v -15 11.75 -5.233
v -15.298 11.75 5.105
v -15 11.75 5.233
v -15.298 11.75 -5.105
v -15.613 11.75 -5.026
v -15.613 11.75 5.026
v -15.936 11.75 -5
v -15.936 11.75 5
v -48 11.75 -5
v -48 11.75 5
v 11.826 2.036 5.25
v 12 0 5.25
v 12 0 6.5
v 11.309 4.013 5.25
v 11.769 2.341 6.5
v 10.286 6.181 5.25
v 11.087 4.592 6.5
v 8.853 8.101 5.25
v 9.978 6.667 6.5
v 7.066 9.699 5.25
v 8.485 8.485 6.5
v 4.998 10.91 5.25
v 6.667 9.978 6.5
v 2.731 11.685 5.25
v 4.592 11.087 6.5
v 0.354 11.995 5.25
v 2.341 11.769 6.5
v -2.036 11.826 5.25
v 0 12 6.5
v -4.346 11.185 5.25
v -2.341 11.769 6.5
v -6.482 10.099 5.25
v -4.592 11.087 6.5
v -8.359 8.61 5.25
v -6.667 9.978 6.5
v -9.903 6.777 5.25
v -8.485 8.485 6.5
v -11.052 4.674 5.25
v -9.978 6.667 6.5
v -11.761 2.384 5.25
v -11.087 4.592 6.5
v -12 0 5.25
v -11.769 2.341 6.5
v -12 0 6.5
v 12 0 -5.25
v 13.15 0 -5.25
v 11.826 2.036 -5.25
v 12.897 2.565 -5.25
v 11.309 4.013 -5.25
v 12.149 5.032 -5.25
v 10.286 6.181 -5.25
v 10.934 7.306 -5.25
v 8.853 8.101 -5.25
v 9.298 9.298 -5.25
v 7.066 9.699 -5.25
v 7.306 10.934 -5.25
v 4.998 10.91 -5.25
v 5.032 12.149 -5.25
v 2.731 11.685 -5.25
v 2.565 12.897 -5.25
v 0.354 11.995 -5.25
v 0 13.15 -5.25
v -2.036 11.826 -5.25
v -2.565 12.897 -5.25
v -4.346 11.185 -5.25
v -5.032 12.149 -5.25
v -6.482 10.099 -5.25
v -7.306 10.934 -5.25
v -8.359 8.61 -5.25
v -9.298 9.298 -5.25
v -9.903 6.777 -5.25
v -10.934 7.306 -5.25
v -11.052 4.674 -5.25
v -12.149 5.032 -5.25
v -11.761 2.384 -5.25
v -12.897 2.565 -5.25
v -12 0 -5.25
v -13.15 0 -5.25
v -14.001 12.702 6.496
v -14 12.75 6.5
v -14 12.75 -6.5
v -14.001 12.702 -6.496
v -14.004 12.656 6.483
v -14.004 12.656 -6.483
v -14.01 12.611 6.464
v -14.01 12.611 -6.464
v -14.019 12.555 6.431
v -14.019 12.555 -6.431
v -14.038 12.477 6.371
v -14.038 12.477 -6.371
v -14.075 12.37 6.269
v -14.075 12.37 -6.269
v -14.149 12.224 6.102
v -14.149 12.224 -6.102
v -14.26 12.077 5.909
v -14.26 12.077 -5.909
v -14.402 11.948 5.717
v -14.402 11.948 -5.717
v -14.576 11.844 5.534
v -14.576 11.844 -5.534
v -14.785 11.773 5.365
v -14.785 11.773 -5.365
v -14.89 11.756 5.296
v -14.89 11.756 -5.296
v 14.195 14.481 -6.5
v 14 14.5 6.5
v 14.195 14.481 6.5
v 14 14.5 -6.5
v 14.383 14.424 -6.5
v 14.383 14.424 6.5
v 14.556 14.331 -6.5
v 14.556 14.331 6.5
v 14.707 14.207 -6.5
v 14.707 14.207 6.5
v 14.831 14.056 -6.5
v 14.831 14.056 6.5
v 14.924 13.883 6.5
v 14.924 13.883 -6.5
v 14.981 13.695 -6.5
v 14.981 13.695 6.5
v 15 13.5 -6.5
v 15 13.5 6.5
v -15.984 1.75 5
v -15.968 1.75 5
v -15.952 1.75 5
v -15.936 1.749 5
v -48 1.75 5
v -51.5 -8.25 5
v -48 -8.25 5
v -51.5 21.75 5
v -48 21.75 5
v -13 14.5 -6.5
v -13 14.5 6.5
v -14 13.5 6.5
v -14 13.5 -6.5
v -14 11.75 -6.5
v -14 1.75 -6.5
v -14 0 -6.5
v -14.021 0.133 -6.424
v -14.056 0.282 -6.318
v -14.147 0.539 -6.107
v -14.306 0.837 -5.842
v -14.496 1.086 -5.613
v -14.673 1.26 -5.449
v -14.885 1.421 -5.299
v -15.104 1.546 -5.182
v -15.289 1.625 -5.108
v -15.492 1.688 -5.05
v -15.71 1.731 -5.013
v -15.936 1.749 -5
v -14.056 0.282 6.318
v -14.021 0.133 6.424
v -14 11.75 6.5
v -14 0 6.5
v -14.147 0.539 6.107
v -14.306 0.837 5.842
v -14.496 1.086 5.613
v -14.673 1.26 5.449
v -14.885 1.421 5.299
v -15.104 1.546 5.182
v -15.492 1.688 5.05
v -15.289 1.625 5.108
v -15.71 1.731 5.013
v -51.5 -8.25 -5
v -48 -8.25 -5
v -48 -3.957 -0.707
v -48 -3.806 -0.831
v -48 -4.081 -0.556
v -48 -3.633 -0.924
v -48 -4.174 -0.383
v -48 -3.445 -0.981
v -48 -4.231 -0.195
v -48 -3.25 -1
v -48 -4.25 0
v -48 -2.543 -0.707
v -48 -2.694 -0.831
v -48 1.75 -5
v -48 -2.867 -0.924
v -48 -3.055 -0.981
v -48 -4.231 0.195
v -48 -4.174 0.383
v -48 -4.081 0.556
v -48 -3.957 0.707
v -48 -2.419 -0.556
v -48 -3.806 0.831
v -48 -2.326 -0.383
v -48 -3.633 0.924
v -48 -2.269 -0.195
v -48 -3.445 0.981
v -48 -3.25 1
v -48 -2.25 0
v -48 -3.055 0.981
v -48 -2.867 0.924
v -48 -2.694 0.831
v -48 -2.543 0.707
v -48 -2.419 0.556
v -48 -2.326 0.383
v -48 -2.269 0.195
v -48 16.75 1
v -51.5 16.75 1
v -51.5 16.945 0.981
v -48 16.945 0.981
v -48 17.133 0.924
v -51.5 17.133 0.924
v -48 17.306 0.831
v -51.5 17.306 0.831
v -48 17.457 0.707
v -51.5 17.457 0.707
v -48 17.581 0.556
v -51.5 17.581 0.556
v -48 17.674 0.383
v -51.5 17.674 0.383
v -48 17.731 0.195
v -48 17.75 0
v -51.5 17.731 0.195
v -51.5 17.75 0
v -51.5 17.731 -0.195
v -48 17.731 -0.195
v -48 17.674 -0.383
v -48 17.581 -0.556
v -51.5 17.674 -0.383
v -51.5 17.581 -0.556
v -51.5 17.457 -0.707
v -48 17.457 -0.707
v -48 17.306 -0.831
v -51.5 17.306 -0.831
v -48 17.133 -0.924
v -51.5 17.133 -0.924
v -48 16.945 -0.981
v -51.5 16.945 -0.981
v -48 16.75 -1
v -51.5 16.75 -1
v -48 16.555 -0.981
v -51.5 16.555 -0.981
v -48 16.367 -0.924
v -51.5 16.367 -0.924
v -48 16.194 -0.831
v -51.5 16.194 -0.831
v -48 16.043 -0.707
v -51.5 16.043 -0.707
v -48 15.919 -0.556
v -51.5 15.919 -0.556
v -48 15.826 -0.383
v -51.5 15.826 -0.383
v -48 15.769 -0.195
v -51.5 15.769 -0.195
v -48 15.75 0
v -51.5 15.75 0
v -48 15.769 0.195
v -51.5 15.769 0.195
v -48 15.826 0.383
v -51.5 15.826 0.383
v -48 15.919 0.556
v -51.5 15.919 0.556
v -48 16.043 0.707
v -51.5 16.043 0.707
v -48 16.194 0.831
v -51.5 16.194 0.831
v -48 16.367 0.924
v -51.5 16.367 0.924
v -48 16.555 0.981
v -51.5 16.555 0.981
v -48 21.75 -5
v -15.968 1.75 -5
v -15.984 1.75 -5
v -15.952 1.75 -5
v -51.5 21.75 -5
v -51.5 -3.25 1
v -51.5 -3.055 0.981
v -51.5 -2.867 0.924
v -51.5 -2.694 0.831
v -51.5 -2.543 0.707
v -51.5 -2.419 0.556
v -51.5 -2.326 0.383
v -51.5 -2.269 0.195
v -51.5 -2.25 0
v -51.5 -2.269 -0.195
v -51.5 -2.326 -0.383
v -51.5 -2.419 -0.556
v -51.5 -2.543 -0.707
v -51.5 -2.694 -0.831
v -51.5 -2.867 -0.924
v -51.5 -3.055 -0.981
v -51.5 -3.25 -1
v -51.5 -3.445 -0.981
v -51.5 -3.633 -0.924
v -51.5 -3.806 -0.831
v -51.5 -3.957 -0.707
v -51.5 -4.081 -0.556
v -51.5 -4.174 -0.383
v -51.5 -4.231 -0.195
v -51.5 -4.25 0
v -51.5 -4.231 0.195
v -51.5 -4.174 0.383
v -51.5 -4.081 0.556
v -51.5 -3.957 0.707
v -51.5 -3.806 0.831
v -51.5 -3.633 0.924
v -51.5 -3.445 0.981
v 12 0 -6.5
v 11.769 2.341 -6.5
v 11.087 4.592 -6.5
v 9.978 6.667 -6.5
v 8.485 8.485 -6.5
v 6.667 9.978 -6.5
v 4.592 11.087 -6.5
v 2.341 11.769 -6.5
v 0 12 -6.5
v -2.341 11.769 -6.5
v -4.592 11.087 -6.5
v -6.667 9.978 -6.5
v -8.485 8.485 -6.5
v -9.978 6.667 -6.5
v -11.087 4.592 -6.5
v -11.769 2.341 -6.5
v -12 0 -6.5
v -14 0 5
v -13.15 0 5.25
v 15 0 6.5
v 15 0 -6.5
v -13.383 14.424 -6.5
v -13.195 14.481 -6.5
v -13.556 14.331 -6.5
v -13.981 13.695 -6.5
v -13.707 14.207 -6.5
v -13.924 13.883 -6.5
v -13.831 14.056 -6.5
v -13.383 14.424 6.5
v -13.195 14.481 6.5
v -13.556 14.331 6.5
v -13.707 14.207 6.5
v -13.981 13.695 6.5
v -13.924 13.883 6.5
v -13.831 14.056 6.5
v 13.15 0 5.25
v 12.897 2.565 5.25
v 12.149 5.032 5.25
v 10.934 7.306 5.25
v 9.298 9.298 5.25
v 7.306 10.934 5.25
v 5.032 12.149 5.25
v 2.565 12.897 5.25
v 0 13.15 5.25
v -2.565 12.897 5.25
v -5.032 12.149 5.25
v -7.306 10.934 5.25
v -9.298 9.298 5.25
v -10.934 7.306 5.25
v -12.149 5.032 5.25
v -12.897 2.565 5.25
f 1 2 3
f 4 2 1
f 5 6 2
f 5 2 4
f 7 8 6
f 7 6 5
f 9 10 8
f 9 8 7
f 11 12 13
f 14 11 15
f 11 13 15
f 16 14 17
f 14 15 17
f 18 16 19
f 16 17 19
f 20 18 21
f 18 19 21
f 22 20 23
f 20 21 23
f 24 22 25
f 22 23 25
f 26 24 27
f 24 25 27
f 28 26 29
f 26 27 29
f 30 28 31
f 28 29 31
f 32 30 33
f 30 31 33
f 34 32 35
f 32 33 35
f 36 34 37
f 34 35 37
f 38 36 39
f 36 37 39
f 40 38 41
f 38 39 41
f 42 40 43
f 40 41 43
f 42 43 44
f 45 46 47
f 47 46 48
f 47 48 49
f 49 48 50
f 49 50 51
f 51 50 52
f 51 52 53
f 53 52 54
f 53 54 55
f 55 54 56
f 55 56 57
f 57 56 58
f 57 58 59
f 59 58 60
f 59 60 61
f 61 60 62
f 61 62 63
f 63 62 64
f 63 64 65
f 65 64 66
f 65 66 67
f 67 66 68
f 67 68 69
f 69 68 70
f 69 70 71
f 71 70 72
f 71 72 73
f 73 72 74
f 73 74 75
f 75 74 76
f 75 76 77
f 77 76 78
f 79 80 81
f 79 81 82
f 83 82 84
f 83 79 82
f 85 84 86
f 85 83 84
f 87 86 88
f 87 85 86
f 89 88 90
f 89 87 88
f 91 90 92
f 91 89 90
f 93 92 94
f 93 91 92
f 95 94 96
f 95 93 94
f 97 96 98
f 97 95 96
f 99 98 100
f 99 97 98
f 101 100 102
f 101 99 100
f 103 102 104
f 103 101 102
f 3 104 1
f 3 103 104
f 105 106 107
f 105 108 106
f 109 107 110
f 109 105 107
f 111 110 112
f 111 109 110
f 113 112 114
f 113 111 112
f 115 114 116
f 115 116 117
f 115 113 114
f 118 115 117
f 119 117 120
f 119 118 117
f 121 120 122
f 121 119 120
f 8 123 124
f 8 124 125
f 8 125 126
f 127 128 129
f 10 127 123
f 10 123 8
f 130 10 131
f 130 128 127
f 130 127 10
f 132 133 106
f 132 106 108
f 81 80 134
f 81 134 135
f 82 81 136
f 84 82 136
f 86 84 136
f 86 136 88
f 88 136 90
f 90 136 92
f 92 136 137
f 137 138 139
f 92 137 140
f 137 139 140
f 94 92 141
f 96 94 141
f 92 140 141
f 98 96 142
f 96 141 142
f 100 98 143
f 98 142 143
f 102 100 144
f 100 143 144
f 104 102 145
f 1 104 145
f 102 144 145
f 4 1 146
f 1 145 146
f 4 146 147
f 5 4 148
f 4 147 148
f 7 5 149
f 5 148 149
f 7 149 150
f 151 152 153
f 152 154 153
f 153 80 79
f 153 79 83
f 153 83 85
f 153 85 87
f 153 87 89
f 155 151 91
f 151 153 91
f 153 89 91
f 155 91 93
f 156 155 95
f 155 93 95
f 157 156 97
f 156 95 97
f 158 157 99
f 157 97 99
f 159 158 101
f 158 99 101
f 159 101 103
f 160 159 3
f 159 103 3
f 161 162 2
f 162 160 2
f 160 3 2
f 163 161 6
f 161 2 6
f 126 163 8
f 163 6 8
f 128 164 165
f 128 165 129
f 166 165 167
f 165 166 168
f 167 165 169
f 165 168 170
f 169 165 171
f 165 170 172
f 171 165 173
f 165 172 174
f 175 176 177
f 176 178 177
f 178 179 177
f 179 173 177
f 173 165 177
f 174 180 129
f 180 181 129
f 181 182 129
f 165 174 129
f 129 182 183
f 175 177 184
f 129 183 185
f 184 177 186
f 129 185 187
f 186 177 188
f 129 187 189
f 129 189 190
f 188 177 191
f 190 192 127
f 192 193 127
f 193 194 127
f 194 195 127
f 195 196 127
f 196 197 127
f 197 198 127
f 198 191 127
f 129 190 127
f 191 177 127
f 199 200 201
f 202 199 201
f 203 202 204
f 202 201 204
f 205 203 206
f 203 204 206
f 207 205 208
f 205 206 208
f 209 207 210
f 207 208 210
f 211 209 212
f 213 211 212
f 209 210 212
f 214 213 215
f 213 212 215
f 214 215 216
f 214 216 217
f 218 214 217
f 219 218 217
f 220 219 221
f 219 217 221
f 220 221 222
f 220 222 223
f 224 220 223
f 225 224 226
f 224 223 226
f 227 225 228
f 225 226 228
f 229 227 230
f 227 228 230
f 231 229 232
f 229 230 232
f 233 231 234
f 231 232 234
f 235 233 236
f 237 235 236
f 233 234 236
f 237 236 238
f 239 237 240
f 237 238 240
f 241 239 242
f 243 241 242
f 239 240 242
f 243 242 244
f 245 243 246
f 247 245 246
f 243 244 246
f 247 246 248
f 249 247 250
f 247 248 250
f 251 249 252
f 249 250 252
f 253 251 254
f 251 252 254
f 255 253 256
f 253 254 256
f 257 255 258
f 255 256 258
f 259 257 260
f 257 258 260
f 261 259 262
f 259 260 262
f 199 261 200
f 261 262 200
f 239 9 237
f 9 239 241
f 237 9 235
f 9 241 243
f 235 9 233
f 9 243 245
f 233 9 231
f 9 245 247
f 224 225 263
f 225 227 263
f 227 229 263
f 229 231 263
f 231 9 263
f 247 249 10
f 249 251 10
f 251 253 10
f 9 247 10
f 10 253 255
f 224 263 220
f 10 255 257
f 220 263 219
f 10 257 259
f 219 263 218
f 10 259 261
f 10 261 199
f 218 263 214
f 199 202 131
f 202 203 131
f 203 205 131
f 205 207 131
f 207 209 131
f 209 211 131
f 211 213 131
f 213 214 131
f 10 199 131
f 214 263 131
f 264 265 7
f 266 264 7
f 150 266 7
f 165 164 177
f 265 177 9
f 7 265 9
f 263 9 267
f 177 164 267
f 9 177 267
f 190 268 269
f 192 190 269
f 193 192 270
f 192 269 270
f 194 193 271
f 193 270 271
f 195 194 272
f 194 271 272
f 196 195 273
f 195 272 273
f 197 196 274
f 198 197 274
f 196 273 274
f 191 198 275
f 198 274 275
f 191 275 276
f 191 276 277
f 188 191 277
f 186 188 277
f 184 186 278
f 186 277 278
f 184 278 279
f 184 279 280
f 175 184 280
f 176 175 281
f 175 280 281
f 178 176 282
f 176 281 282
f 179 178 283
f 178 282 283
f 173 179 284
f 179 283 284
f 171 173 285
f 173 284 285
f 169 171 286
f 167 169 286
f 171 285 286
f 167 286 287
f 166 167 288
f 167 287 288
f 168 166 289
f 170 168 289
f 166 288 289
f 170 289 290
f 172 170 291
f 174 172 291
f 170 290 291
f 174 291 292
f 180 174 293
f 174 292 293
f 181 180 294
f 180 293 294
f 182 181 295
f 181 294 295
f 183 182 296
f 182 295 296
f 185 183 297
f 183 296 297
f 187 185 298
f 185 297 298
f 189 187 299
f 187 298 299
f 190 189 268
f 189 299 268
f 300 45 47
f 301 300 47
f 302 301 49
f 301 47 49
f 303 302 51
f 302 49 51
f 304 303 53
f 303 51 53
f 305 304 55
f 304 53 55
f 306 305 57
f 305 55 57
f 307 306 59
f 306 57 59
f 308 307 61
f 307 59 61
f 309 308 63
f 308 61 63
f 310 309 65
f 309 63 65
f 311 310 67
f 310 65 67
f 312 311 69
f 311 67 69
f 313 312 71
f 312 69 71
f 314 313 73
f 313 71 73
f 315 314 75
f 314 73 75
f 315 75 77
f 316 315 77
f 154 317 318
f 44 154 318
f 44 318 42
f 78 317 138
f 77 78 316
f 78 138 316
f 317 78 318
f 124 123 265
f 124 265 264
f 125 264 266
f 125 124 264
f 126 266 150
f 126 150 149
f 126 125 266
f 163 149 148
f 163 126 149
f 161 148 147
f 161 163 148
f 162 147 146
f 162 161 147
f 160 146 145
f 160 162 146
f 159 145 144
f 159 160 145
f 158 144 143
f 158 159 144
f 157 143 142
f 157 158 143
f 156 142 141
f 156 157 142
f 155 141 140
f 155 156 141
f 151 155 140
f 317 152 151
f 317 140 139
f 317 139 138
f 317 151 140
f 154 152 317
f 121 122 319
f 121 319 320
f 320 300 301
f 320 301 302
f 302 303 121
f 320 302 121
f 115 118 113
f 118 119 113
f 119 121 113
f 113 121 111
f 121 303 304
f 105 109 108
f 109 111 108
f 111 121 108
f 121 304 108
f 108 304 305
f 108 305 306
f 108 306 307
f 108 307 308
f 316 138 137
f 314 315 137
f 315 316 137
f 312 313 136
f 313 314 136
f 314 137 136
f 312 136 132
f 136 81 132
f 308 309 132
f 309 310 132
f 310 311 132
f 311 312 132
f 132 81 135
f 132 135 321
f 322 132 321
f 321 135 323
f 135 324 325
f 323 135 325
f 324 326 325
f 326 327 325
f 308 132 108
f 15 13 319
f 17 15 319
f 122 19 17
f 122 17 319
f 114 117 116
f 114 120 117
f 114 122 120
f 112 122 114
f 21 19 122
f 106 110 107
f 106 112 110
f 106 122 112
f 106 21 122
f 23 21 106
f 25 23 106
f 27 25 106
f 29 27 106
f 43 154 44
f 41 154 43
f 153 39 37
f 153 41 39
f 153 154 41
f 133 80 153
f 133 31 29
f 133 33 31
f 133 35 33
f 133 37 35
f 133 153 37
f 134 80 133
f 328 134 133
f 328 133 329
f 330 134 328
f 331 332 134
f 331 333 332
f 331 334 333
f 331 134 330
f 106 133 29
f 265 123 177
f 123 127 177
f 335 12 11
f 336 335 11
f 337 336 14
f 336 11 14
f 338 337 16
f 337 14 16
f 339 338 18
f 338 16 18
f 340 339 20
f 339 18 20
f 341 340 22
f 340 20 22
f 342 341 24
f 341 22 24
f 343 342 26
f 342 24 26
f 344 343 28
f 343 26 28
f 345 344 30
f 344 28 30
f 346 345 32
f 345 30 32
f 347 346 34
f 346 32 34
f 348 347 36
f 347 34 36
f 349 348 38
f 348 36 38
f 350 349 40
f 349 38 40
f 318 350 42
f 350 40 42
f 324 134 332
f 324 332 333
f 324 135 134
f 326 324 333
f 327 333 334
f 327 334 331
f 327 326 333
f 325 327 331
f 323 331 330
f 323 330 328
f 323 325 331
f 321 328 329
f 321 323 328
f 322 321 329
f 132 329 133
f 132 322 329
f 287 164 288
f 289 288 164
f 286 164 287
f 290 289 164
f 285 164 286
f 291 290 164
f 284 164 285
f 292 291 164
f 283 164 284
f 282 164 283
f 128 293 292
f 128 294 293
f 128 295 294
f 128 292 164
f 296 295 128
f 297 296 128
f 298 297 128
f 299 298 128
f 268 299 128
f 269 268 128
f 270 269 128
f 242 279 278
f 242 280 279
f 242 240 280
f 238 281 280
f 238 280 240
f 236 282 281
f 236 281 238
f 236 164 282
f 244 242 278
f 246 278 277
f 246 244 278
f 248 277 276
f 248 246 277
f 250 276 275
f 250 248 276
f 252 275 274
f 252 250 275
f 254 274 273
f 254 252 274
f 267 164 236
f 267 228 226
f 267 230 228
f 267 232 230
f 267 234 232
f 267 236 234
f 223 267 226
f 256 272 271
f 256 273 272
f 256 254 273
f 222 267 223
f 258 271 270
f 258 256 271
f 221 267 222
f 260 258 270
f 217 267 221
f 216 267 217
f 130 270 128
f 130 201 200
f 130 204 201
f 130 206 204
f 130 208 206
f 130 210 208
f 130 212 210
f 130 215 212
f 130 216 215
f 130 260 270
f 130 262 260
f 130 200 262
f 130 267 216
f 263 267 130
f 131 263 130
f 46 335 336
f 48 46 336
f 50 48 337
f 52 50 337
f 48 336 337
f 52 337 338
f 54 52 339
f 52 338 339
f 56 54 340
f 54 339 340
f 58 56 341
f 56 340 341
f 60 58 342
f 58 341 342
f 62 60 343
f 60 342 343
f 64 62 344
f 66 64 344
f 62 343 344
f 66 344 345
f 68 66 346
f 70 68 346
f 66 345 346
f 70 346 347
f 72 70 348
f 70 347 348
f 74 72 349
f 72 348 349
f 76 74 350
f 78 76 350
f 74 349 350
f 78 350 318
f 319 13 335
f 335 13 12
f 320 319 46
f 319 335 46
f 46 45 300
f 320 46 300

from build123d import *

# Parameters (mm, degrees)
SKETCH_5_W          = 28
SKETCH_5_H          = 13
EXTRUDE_4_DEPTH     = 13.5
SKETCH_6_W          = 13.15
SKETCH_6_H          = 10.5
SKETCH_8_R          = 12
CUT_EXTRUDE_1_DEPTH = 13
SKETCH_9_W          = 28
SKETCH_9_H          = 13
EXTRUDE_5_DEPTH     = 1
SKETCH_11_W         = 13
SKETCH_11_H         = 14.5
EXTRUDE_6_DEPTH     = 1
FILLET_1_R          = 1
SKETCH_12_W         = 10
SKETCH_12_H         = 10
EXTRUDE_7_DEPTH     = 37.5
SKETCH_13_W         = 10
SKETCH_13_H         = 30
SKETCH_13_R         = 1
EXTRUDE_8_DEPTH     = 3.5
FILLET_2_R          = 2
FILLET_3_R          = 1


with BuildPart() as part:
    # 스케치5 → 보스-돌출4 (new body)
    with BuildSketch(Plane(origin=(0, 0, 0), x_dir=(1, 0, 0), z_dir=(0, 1, 0))):
        Rectangle(SKETCH_5_W, SKETCH_5_H)
    extrude(amount=EXTRUDE_4_DEPTH)

    # 컷-스윕1: sweep along a path in 스케치7
    with BuildLine(Plane.XY.offset(6.5)) as sweep_1_path:
        CenterArc((0, 0), 13.15, 0, 360)
    # 스케치6 → 컷-스윕1 (sweep, cut)
    with BuildSketch(Plane.XZ):
        with Locations((6.575, 0)):
            Rectangle(SKETCH_6_W, SKETCH_6_H)
    sweep(path=sweep_1_path.line, mode=Mode.SUBTRACT)

    # 스케치8 → 컷-돌출1 (cut)
    with BuildSketch(Plane.XY.offset(6.5)):
        Circle(SKETCH_8_R)
    extrude(amount=-CUT_EXTRUDE_1_DEPTH, mode=Mode.SUBTRACT)

    # 스케치9 → 보스-돌출5 (add)
    with BuildSketch(Plane(origin=(0, 13.5, 0), x_dir=(1, 0, 0), z_dir=(0, 1, 0))):
        Rectangle(SKETCH_9_W, SKETCH_9_H)
    extrude(amount=EXTRUDE_5_DEPTH)

    # 스케치11 → 보스-돌출6 (add)
    with BuildSketch(Plane(origin=(14, 0, 0), x_dir=(0, 0, -1), z_dir=(1, 0, 0))):
        with Locations((0, 7.25)):
            Rectangle(SKETCH_11_W, SKETCH_11_H)
    extrude(amount=EXTRUDE_6_DEPTH)

    # 필렛1
    fillet_1_edges = [part.edges().sort_by_distance(p)[0] for p in [
        (-14, 14.5, 0),
        (15, 14.5, 0),
    ]]
    fillet(fillet_1_edges, radius=FILLET_1_R)

    # 스케치12 → 보스-돌출7 (add)
    with BuildSketch(Plane.ZY.offset(14)):
        with Locations((0, 6.75)):
            Rectangle(SKETCH_12_W, SKETCH_12_H)
    extrude(amount=EXTRUDE_7_DEPTH)

    # 스케치13 → 보스-돌출8 (add)
    with BuildSketch(Plane.ZY.offset(51.5)):
        with Locations((0, 6.75)):
            Rectangle(SKETCH_13_W, SKETCH_13_H)
        with Locations((0, 16.75)):
            Circle(SKETCH_13_R, mode=Mode.SUBTRACT)
        with Locations((0, -3.25)):
            Circle(SKETCH_13_R, mode=Mode.SUBTRACT)
    extrude(amount=-EXTRUDE_8_DEPTH)

    # 필렛2
    # the kernel refuses this fillet: 2 mm, written as the material it adds along each edge
    with BuildSketch(Plane(origin=(-14, 11.75, 5), x_dir=(0, 0, 1), z_dir=(0, -1, 0)), Plane(origin=(-14, 1.75, -5), x_dir=(0, 0, -1), z_dir=(0, 1, 0))) as fillet_2_piece_1:
        with BuildLine():
            CenterArc((2, 1.936491673), FILLET_2_R, 180, 75.522487814)
            Line((0, 1.936491673), (-0.04, 1.936491673))
            Line((-0.04, 1.936491673), (-0.04, 0))
            Line((-0.04, 0), (0, -0.04))
            ThreePointArc((0, -0.04), (0.75, -0.04), (1.49, -0.038729833))
            Line((1.49, -0.038729833), (1.5, 0))
        make_face()
    extrude(amount=10)
    with BuildSketch(Plane(origin=(-14, 1.75, 5), x_dir=(0, -1, 0), z_dir=(0, 0, -1))) as fillet_2_piece_2:
        with BuildLine():
            CenterArc((2, 1.984313483), FILLET_2_R, 180, 82.819244219)
            Line((0, 1.984313483), (-0.04, 1.984313483))
            Line((-0.04, 1.984313483), (-0.04, 0))
            Line((-0.04, 0), (0, -0.04))
            ThreePointArc((0, -0.04), (0.875, -0.04), (1.745, -0.03968627))
            Line((1.745, -0.03968627), (1.75, 0))
        make_face()
    extrude(amount=10)
    with BuildSketch(Plane(origin=(-14, 11.75, 5), x_dir=(0, 0, 1), z_dir=(0, -1, 0))) as fillet_2_piece_3a_section:
        with BuildLine():
            CenterArc((2, 1.936491673), FILLET_2_R, 180, 75.522487814)
            Line((0, 1.936491673), (-0.04, 1.936491673))
            Line((-0.04, 1.936491673), (-0.04, 0))
            Line((-0.04, 0), (0, -0.04))
            ThreePointArc((0, -0.04), (0.75, -0.04), (1.49, -0.038729833))
            Line((1.49, -0.038729833), (1.5, 0))
        make_face()
    fillet_2_piece_3a = extrude(amount=14.841229183, mode=Mode.PRIVATE)
    fillet_2_piece_3a = split(fillet_2_piece_3a, bisect_by=Plane(origin=(-14.456288202, 0, 5.379183511), z_dir=(0, 1, 0)), keep=Keep.TOP, mode=Mode.PRIVATE)
    fillet_2_piece_3a = split(fillet_2_piece_3a, bisect_by=Plane(origin=(-14.456288202, 1.75, 5.379183511), z_dir=(0, -1, 0)), keep=Keep.TOP, mode=Mode.PRIVATE)
    with BuildSketch(Plane(origin=(-14, 1.75, 9.960783708), x_dir=(0, -1, 0), z_dir=(0, 0, -1))) as fillet_2_piece_3b_section:
        with BuildLine():
            CenterArc((2, 1.984313483), FILLET_2_R, 180, 82.819244219)
            Line((0, 1.984313483), (-0.04, 1.984313483))
            Line((-0.04, 1.984313483), (-0.04, 0))
            Line((-0.04, 0), (0, -0.04))
            ThreePointArc((0, -0.04), (0.875, -0.04), (1.745, -0.03968627))
            Line((1.745, -0.03968627), (1.75, 0))
        make_face()
    fillet_2_piece_3b = extrude(amount=14.960783708, mode=Mode.PRIVATE)
    fillet_2_piece_3b = split(fillet_2_piece_3b, bisect_by=Plane(origin=(-14.456897386, 1.324929313, 6.5), z_dir=(0, 0, -1)), keep=Keep.TOP, mode=Mode.PRIVATE)
    fillet_2_piece_3b = split(fillet_2_piece_3b, bisect_by=Plane(origin=(-14.456897386, 1.324929313, 5), z_dir=(0, 0, 1)), keep=Keep.TOP, mode=Mode.PRIVATE)
    fillet_2_piece_3 = fillet_2_piece_3a & fillet_2_piece_3b
    add(fillet_2_piece_3)
    with BuildSketch(Plane(origin=(-14, 1.75, 5), x_dir=(0, -1, 0), z_dir=(0, 0, -1))) as fillet_2_piece_4a_section:
        with BuildLine():
            CenterArc((2, 1.984313483), FILLET_2_R, 180, 82.819244219)
            Line((0, 1.984313483), (-0.04, 1.984313483))
            Line((-0.04, 1.984313483), (-0.04, 0))
            Line((-0.04, 0), (0, -0.04))
            ThreePointArc((0, -0.04), (0.875, -0.04), (1.745, -0.03968627))
            Line((1.745, -0.03968627), (1.75, 0))
        make_face()
    fillet_2_piece_4a = extrude(amount=14.960783708, mode=Mode.PRIVATE)
    fillet_2_piece_4a = split(fillet_2_piece_4a, bisect_by=Plane(origin=(-14.456897386, 1.324929313, -6.5), z_dir=(0, 0, 1)), keep=Keep.TOP, mode=Mode.PRIVATE)
    fillet_2_piece_4a = split(fillet_2_piece_4a, bisect_by=Plane(origin=(-14.456897386, 1.324929313, -5), z_dir=(0, 0, -1)), keep=Keep.TOP, mode=Mode.PRIVATE)
    with BuildSketch(Plane(origin=(-14, -3.091229183, -5), x_dir=(0, 0, -1), z_dir=(0, 1, 0))) as fillet_2_piece_4b_section:
        with BuildLine():
            CenterArc((2, 1.936491673), FILLET_2_R, 180, 75.522487814)
            Line((0, 1.936491673), (-0.04, 1.936491673))
            Line((-0.04, 1.936491673), (-0.04, 0))
            Line((-0.04, 0), (0, -0.04))
            ThreePointArc((0, -0.04), (0.75, -0.04), (1.49, -0.038729833))
            Line((1.49, -0.038729833), (1.5, 0))
        make_face()
    fillet_2_piece_4b = extrude(amount=14.841229183, mode=Mode.PRIVATE)
    fillet_2_piece_4b = split(fillet_2_piece_4b, bisect_by=Plane(origin=(-14.456288202, 0, -5.379183511), z_dir=(0, 1, 0)), keep=Keep.TOP, mode=Mode.PRIVATE)
    fillet_2_piece_4b = split(fillet_2_piece_4b, bisect_by=Plane(origin=(-14.456288202, 1.75, -5.379183511), z_dir=(0, -1, 0)), keep=Keep.TOP, mode=Mode.PRIVATE)
    fillet_2_piece_4 = fillet_2_piece_4a & fillet_2_piece_4b
    add(fillet_2_piece_4)

    # 필렛3
    # the kernel refuses this fillet: 1 mm, written as the material it adds along each edge
    with BuildSketch(Plane(origin=(-14, 11.75, 6.5), x_dir=(0, 1, 0), z_dir=(0, 0, -1))) as fillet_3_piece_1_section:
        with BuildLine():
            CenterArc((FILLET_3_R, -FILLET_3_R), FILLET_3_R, 90, 90)
            Line((0, -FILLET_3_R), (0, 0))
            Line((0, 0), (FILLET_3_R, 0))
        make_face()
    fillet_3_piece_1 = extrude(amount=13, mode=Mode.PRIVATE)
    fillet_3_piece_1 = fillet_3_piece_1 - Plane(origin=(-15.936491673, 11.983902991, -7), x_dir=(0, 0, -1), z_dir=(0, -1, 0)) * Cylinder(2, 30, mode=Mode.PRIVATE)
    fillet_3_piece_1 = fillet_3_piece_1 - Plane(origin=(-15.936491673, 11.983902991, 7), x_dir=(0, 0, 1), z_dir=(0, 1, 0)) * Cylinder(2, 30, mode=Mode.PRIVATE)
    add(fillet_3_piece_1)


solid = part.part
